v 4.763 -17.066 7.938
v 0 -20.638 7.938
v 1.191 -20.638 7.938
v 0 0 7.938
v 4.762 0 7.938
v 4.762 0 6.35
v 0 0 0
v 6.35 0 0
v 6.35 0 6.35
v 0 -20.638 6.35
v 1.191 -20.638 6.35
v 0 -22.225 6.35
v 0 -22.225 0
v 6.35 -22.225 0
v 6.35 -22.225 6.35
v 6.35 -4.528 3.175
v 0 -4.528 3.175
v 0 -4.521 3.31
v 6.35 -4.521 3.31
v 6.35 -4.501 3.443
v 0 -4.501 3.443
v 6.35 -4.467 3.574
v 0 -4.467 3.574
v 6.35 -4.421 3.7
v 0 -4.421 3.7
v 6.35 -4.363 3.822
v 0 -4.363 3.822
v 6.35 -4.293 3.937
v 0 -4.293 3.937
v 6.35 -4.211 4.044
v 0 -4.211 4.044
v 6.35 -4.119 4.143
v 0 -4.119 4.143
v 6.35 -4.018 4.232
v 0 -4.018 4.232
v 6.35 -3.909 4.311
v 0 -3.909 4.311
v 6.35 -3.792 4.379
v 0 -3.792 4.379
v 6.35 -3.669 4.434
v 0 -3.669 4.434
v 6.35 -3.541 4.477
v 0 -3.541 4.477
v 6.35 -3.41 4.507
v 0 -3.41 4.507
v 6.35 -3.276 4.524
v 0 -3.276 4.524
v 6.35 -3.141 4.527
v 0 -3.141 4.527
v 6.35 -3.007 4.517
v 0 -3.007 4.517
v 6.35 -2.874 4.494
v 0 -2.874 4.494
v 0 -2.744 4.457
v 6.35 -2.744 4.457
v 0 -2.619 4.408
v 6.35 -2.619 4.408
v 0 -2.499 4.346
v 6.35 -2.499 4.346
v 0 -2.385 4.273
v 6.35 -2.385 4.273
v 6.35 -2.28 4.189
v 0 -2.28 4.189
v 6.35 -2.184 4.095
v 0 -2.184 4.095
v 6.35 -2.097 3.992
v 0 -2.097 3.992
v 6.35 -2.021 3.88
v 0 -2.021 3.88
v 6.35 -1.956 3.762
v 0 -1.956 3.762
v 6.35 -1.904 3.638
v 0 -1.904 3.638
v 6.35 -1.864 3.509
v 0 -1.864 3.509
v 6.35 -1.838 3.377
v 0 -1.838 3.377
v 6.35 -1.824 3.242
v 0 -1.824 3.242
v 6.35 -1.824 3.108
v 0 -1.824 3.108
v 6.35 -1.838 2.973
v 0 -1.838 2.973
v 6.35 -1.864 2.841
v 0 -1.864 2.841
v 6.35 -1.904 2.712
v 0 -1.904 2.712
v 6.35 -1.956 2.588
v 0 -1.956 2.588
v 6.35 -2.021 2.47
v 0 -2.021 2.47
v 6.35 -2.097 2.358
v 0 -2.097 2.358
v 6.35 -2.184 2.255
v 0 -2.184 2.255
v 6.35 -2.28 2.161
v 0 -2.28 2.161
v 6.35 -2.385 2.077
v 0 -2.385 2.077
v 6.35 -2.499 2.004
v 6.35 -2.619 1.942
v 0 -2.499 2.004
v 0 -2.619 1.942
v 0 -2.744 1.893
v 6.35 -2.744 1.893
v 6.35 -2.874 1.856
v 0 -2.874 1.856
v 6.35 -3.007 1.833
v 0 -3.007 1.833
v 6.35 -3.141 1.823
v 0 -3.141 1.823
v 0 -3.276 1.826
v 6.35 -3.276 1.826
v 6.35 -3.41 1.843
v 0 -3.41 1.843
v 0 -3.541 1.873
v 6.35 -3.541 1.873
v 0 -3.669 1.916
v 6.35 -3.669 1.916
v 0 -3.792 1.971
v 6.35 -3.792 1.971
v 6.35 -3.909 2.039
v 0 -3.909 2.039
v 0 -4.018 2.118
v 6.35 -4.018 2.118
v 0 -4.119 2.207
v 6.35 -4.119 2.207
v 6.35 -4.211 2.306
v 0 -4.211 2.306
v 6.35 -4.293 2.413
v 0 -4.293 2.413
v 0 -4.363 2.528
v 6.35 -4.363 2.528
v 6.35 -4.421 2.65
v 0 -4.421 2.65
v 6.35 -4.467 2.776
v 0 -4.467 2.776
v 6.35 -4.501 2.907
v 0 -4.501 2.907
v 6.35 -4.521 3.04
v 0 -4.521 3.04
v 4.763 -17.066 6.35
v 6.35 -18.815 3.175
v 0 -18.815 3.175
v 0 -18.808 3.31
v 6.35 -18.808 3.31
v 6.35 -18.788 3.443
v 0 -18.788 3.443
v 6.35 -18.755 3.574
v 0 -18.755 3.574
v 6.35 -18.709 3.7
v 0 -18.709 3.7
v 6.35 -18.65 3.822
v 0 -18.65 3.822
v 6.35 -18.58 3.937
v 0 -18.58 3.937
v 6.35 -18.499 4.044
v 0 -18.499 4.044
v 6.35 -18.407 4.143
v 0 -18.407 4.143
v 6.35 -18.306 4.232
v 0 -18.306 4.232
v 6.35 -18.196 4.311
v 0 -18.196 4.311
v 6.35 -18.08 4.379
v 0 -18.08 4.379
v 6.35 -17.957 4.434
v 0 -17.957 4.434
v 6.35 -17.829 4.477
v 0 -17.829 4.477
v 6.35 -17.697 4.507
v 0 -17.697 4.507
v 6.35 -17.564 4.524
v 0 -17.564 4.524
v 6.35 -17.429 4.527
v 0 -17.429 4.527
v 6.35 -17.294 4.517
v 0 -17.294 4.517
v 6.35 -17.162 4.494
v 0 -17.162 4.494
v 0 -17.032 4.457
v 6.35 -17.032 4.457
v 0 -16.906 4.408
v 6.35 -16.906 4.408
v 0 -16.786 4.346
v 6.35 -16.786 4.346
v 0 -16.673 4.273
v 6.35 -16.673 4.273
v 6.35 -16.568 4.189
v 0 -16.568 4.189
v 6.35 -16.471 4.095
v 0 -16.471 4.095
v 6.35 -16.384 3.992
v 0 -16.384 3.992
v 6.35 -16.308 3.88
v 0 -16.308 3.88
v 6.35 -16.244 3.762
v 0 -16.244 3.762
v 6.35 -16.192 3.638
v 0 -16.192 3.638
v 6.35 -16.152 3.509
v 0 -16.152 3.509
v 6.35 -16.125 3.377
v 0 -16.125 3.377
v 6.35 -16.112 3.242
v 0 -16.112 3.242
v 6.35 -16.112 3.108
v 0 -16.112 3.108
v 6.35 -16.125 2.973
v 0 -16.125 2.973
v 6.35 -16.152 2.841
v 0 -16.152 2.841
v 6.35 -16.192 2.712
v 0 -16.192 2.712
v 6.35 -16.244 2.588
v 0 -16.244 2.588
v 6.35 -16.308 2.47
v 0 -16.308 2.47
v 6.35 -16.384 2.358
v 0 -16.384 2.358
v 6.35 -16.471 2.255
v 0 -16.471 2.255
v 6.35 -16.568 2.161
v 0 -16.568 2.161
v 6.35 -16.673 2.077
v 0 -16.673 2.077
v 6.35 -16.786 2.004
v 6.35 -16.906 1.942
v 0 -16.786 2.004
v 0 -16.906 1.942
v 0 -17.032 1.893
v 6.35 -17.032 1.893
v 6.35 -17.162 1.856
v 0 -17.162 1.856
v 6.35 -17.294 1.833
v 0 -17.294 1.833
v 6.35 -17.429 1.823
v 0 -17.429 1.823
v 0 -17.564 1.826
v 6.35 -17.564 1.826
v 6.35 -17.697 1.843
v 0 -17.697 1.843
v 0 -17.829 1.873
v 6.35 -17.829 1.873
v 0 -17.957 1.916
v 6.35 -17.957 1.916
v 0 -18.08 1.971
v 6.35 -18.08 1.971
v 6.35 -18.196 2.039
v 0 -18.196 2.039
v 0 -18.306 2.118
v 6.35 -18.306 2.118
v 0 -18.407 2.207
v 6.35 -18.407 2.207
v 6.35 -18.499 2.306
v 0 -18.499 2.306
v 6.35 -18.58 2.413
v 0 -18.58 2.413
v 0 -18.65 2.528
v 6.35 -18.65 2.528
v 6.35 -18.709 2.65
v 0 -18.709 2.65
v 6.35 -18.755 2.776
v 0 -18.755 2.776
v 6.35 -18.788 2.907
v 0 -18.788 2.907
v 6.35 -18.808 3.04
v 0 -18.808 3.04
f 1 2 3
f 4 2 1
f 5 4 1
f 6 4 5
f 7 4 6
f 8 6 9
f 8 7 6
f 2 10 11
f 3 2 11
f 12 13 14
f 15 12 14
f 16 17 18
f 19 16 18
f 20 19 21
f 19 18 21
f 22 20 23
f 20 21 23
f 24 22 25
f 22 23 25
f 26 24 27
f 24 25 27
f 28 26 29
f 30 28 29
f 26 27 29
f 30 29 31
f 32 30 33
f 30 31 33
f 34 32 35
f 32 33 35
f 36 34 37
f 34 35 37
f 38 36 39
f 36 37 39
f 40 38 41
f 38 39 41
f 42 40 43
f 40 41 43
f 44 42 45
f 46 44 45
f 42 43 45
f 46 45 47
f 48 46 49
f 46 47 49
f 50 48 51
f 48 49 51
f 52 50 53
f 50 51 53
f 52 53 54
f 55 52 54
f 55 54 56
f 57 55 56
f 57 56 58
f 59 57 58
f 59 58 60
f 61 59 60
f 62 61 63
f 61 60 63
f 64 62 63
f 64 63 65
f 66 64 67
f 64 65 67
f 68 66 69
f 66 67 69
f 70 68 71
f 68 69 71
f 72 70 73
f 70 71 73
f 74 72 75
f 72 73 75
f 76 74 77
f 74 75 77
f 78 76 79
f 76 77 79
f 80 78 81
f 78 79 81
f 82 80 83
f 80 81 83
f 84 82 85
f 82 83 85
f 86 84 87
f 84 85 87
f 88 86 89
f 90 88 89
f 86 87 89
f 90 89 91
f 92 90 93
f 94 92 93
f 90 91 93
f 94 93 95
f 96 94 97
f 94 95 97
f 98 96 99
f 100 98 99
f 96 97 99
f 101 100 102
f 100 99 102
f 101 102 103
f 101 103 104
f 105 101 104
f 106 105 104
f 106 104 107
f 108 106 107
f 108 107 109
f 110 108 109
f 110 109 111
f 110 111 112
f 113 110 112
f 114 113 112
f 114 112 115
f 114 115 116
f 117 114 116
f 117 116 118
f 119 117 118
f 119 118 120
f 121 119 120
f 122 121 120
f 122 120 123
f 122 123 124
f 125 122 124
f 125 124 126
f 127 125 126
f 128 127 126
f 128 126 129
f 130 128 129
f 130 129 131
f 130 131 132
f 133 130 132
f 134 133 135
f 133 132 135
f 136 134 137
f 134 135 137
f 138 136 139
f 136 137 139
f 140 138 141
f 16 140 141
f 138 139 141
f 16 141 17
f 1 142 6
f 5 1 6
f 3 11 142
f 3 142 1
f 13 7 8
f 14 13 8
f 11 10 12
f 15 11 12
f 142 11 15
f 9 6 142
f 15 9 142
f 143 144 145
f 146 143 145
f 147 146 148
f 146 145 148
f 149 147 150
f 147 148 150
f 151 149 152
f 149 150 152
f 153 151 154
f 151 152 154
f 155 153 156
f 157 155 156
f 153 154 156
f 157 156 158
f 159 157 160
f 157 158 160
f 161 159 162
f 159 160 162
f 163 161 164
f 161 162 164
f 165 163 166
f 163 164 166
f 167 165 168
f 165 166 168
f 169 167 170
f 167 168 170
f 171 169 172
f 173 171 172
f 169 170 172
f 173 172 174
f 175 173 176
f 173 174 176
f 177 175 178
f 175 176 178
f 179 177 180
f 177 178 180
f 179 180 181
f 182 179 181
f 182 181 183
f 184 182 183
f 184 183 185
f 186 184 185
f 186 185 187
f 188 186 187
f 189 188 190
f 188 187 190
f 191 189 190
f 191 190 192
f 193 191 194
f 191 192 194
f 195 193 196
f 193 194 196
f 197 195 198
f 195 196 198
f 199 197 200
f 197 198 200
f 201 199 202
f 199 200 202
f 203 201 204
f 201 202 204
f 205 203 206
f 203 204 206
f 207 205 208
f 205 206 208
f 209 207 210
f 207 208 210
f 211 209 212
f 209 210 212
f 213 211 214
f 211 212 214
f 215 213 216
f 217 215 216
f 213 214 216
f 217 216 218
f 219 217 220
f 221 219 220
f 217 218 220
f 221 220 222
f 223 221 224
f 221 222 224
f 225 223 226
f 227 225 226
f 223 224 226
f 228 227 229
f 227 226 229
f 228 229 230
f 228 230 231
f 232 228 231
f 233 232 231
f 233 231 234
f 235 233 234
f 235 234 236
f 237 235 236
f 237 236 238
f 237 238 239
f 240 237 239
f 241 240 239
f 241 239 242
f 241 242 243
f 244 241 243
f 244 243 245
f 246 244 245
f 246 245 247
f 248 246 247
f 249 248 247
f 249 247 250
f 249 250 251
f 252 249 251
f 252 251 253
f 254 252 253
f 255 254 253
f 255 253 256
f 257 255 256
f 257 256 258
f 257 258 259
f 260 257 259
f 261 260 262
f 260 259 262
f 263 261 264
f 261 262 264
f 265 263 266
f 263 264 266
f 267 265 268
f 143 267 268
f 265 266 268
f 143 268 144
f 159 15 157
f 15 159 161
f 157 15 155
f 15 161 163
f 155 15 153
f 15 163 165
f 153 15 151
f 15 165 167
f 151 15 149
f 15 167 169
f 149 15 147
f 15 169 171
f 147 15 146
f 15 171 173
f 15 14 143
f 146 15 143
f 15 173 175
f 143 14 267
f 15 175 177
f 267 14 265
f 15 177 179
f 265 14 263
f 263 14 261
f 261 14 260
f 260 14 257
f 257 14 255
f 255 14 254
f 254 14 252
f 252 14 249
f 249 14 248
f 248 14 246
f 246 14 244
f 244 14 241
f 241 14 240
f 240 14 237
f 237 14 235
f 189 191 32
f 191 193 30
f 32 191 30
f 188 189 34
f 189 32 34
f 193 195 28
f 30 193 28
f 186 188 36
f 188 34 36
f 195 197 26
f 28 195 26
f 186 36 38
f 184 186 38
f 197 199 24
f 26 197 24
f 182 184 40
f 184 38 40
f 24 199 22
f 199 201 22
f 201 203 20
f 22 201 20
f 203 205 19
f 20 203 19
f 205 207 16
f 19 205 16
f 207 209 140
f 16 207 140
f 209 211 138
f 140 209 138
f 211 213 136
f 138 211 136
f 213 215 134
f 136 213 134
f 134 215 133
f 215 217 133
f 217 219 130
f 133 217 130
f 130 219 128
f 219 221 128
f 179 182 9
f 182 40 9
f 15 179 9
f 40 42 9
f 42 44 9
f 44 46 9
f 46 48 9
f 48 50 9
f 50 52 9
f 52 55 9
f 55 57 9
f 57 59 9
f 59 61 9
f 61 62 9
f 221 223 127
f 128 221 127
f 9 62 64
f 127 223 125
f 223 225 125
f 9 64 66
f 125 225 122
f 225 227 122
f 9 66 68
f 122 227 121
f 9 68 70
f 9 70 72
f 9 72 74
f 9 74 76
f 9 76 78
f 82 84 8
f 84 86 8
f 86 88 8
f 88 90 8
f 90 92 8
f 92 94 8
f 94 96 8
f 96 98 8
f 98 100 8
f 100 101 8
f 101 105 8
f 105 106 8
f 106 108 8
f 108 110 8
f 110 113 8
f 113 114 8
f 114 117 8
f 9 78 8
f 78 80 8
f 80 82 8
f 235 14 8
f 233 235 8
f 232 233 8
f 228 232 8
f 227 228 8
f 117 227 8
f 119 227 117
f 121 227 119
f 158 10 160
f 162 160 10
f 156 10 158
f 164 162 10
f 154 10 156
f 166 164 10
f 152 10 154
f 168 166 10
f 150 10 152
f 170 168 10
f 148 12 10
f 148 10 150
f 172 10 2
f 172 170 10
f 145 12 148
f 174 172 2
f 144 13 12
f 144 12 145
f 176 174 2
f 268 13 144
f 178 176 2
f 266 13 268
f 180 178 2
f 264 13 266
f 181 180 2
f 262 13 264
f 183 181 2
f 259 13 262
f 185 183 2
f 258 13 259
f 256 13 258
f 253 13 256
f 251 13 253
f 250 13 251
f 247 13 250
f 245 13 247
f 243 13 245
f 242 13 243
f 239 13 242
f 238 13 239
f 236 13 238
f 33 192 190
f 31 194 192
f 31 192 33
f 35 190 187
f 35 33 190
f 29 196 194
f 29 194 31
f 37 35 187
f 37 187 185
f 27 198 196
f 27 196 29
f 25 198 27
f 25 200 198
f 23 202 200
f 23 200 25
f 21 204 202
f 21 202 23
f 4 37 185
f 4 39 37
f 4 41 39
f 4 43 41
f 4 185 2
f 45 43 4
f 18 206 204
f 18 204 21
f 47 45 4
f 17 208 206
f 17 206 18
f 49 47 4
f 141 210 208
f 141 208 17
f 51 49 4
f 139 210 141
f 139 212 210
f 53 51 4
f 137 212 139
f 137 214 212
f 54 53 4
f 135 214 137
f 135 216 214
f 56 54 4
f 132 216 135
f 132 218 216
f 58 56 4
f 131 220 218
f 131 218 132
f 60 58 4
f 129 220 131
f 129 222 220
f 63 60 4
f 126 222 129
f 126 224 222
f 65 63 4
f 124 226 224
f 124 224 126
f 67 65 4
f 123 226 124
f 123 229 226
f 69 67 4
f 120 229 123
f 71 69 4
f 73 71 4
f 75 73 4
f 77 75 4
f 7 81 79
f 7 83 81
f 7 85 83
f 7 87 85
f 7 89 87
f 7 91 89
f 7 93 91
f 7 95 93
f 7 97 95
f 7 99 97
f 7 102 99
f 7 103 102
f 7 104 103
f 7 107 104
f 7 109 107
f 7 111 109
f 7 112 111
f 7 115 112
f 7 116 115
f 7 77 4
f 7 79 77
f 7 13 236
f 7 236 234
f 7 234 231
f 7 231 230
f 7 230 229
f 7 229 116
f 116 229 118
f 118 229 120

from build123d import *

# Parameters (mm, degrees)
F0_W     = 6.35
F0_H     = 22.225
F1_DEPTH = 6.35
F2_W     = 4.7625
F2_H     = 20.6375
F3_DEPTH = 1.5875
F4_R     = 1.35255
F5_DEPTH = 6.35
F6_SIZE  = 3.57124


with BuildPart() as f1:
    # F0 (on Top) → F1 (new body)
    with BuildSketch(Plane.XY):
        with Locations((3.175, -11.1125)):
            Rectangle(F0_W, F0_H)
    extrude(amount=F1_DEPTH)

    # F2 (on face) → F3 (join)
    with BuildSketch(Plane.XY.offset(6.35)):
        with Locations((2.38125, -10.31875)):
            Rectangle(F2_W, F2_H)
    extrude(amount=F3_DEPTH)

    # F4 (on face) → F5 (cut)
    with BuildSketch(Plane(origin=(0, 0, 0), x_dir=(0, -1, 0), z_dir=(-1, 0, 0))):
        with Locations((17.4625, 3.175)):
            Circle(F4_R)
        with Locations((3.175, 3.175)):
            Circle(F4_R)
    extrude(amount=-F5_DEPTH, mode=Mode.SUBTRACT)

    # F6
    f6_edges = [f1.edges().sort_by_distance(p)[0] for p in [
        (4.7625, -20.6375, 7.14375),
    ]]
    chamfer(f6_edges, length=F6_SIZE)


solid = f1.part
